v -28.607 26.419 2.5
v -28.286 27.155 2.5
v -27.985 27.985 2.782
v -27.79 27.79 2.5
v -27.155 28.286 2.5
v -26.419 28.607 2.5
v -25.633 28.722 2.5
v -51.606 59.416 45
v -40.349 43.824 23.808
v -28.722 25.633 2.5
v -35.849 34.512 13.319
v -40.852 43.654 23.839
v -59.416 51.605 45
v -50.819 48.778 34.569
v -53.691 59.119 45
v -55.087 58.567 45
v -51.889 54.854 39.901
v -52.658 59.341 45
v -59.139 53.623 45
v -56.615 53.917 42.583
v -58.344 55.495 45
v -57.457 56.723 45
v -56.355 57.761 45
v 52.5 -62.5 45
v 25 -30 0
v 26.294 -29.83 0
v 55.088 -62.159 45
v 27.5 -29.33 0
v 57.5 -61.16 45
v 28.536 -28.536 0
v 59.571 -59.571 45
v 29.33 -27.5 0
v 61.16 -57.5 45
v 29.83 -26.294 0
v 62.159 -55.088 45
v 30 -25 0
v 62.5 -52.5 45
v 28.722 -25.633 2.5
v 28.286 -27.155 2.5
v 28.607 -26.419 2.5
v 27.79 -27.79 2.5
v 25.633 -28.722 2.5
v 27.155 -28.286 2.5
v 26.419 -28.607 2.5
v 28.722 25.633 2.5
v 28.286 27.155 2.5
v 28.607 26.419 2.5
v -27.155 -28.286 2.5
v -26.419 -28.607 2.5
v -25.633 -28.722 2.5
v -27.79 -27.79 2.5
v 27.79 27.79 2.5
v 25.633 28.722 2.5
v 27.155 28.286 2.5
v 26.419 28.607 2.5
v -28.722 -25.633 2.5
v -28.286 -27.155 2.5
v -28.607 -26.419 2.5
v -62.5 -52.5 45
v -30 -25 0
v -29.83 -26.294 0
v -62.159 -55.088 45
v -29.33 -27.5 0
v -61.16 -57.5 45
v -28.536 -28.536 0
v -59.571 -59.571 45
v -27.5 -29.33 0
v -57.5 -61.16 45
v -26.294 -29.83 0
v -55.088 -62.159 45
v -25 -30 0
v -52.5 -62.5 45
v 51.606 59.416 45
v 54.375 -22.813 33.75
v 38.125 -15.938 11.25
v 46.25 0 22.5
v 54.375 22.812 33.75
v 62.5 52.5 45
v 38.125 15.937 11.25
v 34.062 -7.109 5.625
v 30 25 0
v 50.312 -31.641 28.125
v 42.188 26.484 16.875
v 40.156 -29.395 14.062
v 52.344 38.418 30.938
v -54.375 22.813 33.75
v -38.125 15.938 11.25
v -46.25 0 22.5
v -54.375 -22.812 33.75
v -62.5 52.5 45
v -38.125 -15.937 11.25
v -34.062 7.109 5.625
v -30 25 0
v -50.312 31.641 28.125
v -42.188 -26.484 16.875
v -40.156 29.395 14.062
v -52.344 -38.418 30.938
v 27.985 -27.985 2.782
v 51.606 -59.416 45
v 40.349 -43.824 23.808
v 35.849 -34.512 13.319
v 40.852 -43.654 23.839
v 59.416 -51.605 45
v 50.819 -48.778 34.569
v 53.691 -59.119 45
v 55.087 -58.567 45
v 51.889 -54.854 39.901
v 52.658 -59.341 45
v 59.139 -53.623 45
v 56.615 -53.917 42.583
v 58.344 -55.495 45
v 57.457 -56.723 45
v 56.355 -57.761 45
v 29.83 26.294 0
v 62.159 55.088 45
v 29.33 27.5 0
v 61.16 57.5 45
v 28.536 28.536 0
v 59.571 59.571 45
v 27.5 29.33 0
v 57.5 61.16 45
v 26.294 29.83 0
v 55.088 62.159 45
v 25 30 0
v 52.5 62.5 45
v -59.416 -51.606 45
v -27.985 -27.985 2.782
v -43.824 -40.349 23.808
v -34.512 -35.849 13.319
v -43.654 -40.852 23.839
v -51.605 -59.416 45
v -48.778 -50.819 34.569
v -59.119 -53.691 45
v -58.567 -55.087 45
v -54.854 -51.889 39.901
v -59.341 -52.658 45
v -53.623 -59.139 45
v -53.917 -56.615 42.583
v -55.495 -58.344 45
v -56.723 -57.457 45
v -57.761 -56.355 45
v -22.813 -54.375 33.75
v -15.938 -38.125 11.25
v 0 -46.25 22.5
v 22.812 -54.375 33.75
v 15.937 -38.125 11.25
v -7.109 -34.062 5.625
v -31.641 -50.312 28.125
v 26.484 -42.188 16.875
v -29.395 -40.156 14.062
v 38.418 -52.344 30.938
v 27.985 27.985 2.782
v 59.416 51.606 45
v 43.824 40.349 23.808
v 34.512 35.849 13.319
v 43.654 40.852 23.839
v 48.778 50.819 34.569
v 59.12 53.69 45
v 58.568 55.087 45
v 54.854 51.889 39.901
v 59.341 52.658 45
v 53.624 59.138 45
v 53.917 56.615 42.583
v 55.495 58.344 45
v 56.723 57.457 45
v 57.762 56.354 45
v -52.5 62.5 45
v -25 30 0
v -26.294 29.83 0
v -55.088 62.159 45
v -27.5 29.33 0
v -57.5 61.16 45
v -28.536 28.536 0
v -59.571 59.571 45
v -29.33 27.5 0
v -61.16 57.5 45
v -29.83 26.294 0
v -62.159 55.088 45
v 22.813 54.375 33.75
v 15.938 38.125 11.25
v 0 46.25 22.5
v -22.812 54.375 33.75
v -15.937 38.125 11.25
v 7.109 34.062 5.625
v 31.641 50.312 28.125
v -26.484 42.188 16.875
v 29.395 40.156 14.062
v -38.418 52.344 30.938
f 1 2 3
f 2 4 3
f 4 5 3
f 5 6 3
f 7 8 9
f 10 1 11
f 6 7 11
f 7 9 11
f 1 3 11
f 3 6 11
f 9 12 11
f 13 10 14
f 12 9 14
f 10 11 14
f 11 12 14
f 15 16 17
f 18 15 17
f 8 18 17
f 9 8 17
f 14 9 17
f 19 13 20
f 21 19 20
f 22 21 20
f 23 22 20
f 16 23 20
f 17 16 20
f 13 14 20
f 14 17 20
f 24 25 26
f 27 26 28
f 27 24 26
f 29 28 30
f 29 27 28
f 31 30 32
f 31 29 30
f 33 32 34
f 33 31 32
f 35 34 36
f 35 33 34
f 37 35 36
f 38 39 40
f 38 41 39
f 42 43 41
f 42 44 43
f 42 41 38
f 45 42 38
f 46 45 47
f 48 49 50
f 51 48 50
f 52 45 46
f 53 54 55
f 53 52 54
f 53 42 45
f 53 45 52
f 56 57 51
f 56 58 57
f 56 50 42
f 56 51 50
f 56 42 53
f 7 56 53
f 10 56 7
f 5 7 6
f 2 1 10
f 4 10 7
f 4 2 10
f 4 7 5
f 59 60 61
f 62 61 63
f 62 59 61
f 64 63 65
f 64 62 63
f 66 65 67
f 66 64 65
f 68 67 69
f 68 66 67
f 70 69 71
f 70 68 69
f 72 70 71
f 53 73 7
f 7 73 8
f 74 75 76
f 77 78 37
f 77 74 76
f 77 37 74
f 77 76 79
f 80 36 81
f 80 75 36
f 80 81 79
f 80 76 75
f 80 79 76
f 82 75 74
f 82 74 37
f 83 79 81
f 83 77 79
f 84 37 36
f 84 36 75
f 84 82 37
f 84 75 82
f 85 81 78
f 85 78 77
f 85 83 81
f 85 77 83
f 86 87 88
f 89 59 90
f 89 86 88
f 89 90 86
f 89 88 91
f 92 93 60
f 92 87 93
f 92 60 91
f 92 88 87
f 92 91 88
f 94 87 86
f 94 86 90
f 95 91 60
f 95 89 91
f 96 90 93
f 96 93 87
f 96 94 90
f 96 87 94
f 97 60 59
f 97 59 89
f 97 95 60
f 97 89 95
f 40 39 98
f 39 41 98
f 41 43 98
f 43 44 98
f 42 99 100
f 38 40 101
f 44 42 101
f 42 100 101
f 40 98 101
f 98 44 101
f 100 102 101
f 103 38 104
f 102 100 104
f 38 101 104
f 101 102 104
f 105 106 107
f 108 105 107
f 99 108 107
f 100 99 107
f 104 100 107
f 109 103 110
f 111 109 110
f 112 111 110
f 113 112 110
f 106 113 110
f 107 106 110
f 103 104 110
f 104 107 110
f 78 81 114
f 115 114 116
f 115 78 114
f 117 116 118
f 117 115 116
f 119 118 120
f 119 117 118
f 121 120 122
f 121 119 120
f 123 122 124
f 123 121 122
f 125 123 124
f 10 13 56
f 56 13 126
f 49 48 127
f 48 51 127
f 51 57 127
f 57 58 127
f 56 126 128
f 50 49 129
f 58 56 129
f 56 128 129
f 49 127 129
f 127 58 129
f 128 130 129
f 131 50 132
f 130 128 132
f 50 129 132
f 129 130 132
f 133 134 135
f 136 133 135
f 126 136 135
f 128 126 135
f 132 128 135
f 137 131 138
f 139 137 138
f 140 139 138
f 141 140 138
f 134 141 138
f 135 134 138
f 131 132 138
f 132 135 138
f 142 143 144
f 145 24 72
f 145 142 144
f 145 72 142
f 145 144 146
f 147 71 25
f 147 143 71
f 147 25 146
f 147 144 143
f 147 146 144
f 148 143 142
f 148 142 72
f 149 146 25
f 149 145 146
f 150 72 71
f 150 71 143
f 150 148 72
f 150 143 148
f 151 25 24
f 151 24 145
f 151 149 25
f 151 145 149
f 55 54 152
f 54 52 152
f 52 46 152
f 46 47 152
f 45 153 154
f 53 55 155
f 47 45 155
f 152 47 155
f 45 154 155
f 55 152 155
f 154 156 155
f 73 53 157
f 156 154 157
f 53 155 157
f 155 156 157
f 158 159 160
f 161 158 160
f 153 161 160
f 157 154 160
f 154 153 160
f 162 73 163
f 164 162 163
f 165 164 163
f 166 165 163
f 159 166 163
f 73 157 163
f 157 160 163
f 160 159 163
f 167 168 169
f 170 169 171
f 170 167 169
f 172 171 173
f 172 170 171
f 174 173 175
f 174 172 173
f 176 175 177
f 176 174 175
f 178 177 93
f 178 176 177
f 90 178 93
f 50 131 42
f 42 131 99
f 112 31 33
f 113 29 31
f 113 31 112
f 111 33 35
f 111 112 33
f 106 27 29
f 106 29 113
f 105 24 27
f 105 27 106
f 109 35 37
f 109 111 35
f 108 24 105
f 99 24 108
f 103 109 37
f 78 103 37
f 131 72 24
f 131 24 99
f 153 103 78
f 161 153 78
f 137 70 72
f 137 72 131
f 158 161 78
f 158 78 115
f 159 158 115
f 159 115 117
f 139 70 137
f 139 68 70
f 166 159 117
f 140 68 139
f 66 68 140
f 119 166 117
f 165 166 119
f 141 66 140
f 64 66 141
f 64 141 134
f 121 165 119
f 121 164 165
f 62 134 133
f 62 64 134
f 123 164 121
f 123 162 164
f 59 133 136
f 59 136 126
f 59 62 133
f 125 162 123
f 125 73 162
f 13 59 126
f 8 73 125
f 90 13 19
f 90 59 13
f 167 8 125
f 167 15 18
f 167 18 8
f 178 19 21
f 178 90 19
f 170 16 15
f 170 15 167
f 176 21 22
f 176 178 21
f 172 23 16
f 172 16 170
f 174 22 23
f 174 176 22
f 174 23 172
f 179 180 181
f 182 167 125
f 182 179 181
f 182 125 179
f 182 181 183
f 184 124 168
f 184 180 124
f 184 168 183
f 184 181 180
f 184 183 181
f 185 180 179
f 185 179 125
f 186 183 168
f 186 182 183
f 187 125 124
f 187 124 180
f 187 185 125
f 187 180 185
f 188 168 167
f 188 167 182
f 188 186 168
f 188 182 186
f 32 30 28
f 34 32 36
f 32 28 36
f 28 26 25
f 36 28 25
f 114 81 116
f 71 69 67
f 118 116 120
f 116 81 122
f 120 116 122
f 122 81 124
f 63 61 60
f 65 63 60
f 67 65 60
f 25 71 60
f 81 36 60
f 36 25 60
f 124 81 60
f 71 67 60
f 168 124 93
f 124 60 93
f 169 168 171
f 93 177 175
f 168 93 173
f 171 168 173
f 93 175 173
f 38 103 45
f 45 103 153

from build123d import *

# Parameters (mm, degrees)
F4_T = -2.5


with BuildPart() as f3:
    # F0 (on Top) → F3 section 0
    with BuildSketch(Plane.XY):
        with BuildLine():
            Line((25, 30), (-25, 30))
            ThreePointArc((-25, 30), (-28.5355339059, 28.5355339059), (-30, 25))
            Line((-30, 25), (-30, -25))
            ThreePointArc((-30, -25), (-28.5355339059, -28.5355339059), (-25, -30))
            Line((-25, -30), (25, -30))
            ThreePointArc((25, -30), (28.5355339059, -28.5355339059), (30, -25))
            Line((30, -25), (30, 25))
            ThreePointArc((30, 25), (28.5355339059, 28.5355339059), (25, 30))
        make_face()
    # F2 (on offset) → F3 section 1
    with BuildSketch(Plane.XY.offset(45)):
        with BuildLine():
            Line((52.5, 62.5), (-52.5, 62.5))
            ThreePointArc((-52.5, 62.5), (-59.5710678119, 59.5710678119), (-62.5, 52.5))
            Line((-62.5, 52.5), (-62.5, -52.5))
            ThreePointArc((-62.5, -52.5), (-59.5710678119, -59.5710678119), (-52.5, -62.5))
            Line((-52.5, -62.5), (52.5, -62.5))
            ThreePointArc((52.5, -62.5), (59.5710678119, -59.5710678119), (62.5, -52.5))
            Line((62.5, -52.5), (62.5, 52.5))
            ThreePointArc((62.5, 52.5), (59.5710678119, 59.5710678119), (52.5, 62.5))
        make_face()
    loft()

    # F4
    f4_openings = [f3.faces().sort_by_distance(p)[0] for p in [
        (0, 0, 45),
    ]]
    offset(amount=F4_T, openings=f4_openings)


solid = f3.part
